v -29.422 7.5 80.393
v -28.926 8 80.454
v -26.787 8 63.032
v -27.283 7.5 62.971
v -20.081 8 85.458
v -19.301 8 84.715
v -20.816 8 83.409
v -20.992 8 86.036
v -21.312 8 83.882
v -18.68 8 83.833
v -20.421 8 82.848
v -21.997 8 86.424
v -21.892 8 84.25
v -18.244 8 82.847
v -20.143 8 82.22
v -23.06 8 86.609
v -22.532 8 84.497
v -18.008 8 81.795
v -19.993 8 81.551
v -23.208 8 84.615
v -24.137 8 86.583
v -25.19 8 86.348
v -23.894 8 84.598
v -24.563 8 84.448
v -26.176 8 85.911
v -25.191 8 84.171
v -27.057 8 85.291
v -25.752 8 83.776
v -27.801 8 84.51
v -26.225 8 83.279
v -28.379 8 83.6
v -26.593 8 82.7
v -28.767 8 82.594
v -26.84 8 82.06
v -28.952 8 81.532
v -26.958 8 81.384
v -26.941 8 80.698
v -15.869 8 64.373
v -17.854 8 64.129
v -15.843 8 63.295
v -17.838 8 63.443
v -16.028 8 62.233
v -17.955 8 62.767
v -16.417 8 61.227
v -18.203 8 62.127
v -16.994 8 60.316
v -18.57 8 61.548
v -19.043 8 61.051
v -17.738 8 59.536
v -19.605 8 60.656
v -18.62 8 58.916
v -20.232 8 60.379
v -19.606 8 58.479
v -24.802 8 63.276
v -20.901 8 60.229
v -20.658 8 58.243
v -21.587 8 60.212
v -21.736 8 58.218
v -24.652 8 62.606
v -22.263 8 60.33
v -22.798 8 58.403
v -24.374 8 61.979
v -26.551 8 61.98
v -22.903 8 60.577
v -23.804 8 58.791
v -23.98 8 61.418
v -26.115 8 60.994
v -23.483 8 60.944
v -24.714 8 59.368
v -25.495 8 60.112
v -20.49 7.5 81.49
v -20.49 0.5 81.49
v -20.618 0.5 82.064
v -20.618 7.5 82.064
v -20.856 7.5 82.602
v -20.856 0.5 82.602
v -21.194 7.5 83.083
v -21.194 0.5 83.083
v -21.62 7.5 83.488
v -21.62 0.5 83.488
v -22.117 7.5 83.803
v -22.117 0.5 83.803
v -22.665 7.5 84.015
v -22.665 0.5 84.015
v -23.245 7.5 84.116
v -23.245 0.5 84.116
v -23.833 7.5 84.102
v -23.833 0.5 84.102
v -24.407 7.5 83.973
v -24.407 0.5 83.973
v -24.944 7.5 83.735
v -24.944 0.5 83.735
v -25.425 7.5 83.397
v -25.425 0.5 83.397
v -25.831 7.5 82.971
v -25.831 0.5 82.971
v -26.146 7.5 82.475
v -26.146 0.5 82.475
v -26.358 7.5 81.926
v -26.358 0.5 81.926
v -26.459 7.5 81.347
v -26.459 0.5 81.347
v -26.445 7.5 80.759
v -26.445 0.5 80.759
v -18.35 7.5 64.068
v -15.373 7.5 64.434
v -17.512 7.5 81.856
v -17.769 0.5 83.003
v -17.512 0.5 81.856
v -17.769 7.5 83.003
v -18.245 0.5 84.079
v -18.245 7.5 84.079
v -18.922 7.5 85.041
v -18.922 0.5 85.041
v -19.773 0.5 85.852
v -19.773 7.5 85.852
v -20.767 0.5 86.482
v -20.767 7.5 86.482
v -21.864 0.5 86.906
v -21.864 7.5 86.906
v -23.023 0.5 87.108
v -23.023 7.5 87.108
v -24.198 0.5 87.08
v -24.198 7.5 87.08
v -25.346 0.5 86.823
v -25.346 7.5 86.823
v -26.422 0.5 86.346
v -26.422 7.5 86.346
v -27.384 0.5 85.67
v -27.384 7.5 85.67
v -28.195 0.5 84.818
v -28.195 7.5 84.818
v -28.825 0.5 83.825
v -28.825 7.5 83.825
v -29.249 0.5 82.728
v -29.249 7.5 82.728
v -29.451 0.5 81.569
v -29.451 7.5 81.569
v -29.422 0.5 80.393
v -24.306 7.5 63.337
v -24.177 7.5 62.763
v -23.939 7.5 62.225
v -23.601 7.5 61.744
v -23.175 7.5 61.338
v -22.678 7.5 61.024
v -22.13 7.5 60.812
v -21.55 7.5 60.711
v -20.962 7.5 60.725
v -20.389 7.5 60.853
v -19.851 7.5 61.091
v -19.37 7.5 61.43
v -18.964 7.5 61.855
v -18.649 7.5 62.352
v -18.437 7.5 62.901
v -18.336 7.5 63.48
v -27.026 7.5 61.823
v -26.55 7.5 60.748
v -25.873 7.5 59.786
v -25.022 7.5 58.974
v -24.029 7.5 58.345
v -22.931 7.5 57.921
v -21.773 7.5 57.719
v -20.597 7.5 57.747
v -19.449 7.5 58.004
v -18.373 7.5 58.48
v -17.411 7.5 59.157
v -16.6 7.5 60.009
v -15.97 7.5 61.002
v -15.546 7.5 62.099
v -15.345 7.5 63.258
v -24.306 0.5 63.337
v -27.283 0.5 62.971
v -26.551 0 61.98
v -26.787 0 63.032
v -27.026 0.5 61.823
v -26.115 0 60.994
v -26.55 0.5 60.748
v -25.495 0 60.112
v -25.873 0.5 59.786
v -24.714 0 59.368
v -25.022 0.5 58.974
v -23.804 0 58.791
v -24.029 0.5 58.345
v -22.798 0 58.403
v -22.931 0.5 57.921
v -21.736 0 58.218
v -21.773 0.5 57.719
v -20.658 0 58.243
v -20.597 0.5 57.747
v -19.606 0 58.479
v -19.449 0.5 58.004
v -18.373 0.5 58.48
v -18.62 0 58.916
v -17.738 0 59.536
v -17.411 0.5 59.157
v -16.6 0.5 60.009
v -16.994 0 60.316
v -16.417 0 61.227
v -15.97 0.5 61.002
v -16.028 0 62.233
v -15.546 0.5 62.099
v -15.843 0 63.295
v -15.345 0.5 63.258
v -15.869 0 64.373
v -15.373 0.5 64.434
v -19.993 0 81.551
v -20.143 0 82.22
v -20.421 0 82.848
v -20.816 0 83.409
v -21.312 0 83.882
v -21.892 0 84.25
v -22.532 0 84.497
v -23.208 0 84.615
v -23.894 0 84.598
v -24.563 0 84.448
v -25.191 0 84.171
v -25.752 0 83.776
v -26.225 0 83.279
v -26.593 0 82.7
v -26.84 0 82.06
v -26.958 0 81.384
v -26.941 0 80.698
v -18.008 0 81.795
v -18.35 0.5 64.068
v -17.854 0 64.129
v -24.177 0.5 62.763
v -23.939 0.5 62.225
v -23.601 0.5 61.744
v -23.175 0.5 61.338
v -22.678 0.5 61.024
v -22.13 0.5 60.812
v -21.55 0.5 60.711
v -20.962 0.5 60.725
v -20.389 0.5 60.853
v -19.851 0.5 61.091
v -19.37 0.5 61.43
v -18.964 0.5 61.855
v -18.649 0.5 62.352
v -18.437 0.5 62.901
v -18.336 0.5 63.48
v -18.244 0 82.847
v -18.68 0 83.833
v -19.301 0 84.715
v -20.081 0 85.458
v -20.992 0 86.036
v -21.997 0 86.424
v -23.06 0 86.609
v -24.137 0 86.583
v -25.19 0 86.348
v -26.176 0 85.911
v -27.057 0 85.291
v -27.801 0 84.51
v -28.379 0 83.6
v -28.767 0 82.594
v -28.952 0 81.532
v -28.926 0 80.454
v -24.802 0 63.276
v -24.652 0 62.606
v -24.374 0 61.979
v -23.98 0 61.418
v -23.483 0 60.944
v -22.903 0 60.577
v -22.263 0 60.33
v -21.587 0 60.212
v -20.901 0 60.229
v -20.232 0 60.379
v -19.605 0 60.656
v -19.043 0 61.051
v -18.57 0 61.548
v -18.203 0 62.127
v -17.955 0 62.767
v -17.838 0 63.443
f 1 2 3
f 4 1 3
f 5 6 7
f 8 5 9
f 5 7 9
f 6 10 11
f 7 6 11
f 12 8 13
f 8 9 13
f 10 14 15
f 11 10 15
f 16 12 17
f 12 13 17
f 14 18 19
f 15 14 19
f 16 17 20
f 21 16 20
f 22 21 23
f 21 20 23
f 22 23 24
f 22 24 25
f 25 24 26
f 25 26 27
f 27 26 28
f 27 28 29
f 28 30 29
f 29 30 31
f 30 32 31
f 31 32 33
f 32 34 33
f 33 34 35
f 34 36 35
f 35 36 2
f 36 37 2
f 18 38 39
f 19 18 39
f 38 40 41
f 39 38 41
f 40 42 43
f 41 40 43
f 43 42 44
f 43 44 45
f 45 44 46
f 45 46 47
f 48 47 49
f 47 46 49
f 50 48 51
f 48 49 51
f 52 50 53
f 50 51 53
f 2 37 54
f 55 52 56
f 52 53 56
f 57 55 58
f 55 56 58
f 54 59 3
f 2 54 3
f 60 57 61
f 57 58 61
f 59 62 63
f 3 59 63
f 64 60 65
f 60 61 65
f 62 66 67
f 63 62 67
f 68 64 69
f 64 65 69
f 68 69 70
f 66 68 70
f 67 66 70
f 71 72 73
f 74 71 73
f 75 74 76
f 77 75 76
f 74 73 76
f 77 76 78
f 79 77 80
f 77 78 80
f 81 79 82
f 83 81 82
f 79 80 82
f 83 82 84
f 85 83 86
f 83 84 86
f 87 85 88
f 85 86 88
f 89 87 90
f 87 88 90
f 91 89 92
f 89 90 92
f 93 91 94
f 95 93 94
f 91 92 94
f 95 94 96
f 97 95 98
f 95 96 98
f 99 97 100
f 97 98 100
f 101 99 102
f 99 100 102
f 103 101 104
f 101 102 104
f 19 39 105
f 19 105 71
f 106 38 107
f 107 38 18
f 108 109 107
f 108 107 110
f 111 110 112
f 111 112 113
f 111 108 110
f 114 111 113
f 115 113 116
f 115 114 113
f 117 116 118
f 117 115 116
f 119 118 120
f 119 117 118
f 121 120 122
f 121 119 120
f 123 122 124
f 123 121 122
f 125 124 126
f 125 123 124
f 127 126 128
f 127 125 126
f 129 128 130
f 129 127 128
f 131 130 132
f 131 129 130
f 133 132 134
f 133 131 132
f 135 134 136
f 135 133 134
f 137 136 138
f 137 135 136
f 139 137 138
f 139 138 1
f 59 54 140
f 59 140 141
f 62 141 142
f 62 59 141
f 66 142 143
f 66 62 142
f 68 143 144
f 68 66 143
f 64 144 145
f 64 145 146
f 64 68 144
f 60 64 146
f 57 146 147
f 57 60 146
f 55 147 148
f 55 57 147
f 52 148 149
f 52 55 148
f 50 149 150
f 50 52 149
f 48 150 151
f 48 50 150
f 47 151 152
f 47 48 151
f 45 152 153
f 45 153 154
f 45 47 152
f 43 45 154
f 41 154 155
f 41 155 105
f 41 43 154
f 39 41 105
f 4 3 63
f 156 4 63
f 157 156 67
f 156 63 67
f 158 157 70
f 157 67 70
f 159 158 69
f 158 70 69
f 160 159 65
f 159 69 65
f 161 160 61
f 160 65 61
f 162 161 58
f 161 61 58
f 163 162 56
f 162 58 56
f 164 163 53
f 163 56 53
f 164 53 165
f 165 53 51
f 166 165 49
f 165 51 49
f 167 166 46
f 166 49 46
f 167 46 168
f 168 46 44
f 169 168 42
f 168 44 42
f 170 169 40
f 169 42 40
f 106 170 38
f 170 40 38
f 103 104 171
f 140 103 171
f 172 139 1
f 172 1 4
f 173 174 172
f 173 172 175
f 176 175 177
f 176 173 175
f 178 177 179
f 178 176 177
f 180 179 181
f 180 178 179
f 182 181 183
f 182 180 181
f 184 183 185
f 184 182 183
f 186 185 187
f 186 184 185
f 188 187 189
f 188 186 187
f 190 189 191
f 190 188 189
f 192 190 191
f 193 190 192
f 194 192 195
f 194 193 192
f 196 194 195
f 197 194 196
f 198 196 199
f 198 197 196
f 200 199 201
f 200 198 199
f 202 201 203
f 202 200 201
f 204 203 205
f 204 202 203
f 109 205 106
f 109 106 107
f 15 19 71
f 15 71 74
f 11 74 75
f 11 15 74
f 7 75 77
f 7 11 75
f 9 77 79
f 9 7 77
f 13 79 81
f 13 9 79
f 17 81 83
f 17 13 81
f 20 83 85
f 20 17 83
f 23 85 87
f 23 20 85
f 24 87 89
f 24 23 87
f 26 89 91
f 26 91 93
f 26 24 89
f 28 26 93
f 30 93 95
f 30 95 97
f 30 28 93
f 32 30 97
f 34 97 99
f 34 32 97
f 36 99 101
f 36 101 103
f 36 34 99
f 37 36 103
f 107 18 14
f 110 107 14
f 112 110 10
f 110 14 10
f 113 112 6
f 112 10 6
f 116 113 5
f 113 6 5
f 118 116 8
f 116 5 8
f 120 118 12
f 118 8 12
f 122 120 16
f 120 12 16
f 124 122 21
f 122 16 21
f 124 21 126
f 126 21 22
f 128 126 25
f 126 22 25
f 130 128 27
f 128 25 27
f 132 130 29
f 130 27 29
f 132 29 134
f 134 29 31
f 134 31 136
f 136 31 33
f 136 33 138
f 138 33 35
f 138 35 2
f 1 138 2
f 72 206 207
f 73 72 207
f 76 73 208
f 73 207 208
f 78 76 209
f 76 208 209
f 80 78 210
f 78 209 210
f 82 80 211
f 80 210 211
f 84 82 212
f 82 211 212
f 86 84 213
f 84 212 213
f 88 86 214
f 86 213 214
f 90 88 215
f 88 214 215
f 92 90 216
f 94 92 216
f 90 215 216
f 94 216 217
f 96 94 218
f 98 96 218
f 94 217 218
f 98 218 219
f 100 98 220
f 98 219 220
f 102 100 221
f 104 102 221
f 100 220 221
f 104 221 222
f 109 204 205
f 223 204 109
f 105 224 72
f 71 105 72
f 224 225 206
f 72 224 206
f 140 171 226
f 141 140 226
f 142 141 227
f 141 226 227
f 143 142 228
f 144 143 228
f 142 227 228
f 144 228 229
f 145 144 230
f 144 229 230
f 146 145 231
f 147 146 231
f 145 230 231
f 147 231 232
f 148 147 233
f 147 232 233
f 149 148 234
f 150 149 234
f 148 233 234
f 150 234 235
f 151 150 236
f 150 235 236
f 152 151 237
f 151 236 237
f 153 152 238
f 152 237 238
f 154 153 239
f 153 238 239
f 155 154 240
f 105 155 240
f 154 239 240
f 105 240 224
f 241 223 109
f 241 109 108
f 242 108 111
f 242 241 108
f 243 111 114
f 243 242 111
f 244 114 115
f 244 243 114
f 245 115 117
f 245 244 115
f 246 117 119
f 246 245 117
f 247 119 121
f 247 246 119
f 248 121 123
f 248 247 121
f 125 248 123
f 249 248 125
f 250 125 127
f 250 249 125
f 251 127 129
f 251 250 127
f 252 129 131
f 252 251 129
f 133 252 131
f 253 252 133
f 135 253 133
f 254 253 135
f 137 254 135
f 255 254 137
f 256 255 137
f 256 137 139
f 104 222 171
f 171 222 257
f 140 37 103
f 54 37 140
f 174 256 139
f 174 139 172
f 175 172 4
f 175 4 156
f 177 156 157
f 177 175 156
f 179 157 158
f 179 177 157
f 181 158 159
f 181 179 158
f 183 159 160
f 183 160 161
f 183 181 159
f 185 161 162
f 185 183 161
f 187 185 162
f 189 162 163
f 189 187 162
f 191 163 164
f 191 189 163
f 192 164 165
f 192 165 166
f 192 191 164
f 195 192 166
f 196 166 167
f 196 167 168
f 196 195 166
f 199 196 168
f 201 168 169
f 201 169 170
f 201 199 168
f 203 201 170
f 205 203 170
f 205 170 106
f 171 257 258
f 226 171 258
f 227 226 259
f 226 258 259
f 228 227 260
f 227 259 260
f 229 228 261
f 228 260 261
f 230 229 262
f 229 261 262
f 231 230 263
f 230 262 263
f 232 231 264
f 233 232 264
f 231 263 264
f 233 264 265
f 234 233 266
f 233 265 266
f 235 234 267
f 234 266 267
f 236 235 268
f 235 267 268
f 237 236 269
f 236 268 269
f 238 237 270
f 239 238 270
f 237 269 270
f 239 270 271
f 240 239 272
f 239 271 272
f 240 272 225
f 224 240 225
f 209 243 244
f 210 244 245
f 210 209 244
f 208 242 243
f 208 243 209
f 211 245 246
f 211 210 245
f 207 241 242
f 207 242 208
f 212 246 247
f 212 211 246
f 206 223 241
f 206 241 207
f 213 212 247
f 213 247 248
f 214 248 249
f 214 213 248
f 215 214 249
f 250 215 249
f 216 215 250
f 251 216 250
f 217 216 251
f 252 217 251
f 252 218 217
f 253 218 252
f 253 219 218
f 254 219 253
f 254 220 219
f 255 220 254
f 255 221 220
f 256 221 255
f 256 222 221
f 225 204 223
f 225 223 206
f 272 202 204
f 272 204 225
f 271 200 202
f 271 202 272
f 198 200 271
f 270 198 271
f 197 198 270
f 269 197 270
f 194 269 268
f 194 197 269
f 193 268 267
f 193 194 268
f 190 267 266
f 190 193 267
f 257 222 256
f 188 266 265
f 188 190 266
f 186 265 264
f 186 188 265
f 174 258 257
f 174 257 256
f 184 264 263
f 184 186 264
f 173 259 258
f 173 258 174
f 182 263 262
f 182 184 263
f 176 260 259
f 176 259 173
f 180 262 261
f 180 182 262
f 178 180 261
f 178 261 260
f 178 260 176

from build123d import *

# Parameters (mm, degrees)
BOSS_EXTRUDE1_DEPTH = 8
CHAMFER1_SIZE       = 0.5


with BuildPart() as part:
    # Sketch1 → Boss-Extrude1 (new body)
    with BuildSketch(Plane(origin=(0, 0, 0), x_dir=(1, 0, 0), z_dir=(0, 1, 0))):
        with BuildLine():
            Line((-29.422447973, -80.393109081), (-27.283313621, -62.971257862))
            ThreePointArc((-27.283313621, -62.971257862), (-20.596820651, -57.747197013), (-15.372759802, -64.433689983))
            Line((-15.372759802, -64.433689983), (-17.511894154, -81.855541202))
            ThreePointArc((-17.511894154, -81.855541202), (-24.198387124, -87.079602051), (-29.422447973, -80.393109081))
        make_face()
        with BuildLine():
            Line((-26.444809519, -80.758717111), (-24.305675167, -63.336865893))
            ThreePointArc((-24.305675167, -63.336865893), (-20.962428681, -60.724835468), (-18.350398257, -64.068081953))
            Line((-18.350398257, -64.068081953), (-20.489532609, -81.489933172))
            ThreePointArc((-20.489532609, -81.489933172), (-23.832779094, -84.101963596), (-26.444809519, -80.758717111))
        make_face(mode=Mode.SUBTRACT)
    extrude(amount=BOSS_EXTRUDE1_DEPTH)

    # Chamfer1
    chamfer1_edges = [part.edges().sort_by_distance(p)[0] for p in [
        (-20.596820651, 8, 57.747197013),
        (-28.352880797, 8, 71.682183472),
        (-20.962428681, 0, 60.724835468),
        (-25.375242343, 0, 72.047791502),
        (-23.832779094, 0, 84.101963596),
        (-19.419965433, 0, 72.779007562),
        (-20.962428681, 8, 60.724835468),
        (-25.375242343, 8, 72.047791502),
        (-23.832779094, 8, 84.101963596),
        (-19.419965433, 8, 72.779007562),
        (-24.198387124, 8, 87.079602051),
        (-28.352880797, 0, 71.682183472),
        (-20.596820651, 0, 57.747197013),
        (-16.442326978, 0, 73.144615593),
        (-24.198387124, 0, 87.079602051),
        (-16.442326978, 8, 73.144615593),
    ]]
    chamfer(chamfer1_edges, length=CHAMFER1_SIZE)


solid = part.part
